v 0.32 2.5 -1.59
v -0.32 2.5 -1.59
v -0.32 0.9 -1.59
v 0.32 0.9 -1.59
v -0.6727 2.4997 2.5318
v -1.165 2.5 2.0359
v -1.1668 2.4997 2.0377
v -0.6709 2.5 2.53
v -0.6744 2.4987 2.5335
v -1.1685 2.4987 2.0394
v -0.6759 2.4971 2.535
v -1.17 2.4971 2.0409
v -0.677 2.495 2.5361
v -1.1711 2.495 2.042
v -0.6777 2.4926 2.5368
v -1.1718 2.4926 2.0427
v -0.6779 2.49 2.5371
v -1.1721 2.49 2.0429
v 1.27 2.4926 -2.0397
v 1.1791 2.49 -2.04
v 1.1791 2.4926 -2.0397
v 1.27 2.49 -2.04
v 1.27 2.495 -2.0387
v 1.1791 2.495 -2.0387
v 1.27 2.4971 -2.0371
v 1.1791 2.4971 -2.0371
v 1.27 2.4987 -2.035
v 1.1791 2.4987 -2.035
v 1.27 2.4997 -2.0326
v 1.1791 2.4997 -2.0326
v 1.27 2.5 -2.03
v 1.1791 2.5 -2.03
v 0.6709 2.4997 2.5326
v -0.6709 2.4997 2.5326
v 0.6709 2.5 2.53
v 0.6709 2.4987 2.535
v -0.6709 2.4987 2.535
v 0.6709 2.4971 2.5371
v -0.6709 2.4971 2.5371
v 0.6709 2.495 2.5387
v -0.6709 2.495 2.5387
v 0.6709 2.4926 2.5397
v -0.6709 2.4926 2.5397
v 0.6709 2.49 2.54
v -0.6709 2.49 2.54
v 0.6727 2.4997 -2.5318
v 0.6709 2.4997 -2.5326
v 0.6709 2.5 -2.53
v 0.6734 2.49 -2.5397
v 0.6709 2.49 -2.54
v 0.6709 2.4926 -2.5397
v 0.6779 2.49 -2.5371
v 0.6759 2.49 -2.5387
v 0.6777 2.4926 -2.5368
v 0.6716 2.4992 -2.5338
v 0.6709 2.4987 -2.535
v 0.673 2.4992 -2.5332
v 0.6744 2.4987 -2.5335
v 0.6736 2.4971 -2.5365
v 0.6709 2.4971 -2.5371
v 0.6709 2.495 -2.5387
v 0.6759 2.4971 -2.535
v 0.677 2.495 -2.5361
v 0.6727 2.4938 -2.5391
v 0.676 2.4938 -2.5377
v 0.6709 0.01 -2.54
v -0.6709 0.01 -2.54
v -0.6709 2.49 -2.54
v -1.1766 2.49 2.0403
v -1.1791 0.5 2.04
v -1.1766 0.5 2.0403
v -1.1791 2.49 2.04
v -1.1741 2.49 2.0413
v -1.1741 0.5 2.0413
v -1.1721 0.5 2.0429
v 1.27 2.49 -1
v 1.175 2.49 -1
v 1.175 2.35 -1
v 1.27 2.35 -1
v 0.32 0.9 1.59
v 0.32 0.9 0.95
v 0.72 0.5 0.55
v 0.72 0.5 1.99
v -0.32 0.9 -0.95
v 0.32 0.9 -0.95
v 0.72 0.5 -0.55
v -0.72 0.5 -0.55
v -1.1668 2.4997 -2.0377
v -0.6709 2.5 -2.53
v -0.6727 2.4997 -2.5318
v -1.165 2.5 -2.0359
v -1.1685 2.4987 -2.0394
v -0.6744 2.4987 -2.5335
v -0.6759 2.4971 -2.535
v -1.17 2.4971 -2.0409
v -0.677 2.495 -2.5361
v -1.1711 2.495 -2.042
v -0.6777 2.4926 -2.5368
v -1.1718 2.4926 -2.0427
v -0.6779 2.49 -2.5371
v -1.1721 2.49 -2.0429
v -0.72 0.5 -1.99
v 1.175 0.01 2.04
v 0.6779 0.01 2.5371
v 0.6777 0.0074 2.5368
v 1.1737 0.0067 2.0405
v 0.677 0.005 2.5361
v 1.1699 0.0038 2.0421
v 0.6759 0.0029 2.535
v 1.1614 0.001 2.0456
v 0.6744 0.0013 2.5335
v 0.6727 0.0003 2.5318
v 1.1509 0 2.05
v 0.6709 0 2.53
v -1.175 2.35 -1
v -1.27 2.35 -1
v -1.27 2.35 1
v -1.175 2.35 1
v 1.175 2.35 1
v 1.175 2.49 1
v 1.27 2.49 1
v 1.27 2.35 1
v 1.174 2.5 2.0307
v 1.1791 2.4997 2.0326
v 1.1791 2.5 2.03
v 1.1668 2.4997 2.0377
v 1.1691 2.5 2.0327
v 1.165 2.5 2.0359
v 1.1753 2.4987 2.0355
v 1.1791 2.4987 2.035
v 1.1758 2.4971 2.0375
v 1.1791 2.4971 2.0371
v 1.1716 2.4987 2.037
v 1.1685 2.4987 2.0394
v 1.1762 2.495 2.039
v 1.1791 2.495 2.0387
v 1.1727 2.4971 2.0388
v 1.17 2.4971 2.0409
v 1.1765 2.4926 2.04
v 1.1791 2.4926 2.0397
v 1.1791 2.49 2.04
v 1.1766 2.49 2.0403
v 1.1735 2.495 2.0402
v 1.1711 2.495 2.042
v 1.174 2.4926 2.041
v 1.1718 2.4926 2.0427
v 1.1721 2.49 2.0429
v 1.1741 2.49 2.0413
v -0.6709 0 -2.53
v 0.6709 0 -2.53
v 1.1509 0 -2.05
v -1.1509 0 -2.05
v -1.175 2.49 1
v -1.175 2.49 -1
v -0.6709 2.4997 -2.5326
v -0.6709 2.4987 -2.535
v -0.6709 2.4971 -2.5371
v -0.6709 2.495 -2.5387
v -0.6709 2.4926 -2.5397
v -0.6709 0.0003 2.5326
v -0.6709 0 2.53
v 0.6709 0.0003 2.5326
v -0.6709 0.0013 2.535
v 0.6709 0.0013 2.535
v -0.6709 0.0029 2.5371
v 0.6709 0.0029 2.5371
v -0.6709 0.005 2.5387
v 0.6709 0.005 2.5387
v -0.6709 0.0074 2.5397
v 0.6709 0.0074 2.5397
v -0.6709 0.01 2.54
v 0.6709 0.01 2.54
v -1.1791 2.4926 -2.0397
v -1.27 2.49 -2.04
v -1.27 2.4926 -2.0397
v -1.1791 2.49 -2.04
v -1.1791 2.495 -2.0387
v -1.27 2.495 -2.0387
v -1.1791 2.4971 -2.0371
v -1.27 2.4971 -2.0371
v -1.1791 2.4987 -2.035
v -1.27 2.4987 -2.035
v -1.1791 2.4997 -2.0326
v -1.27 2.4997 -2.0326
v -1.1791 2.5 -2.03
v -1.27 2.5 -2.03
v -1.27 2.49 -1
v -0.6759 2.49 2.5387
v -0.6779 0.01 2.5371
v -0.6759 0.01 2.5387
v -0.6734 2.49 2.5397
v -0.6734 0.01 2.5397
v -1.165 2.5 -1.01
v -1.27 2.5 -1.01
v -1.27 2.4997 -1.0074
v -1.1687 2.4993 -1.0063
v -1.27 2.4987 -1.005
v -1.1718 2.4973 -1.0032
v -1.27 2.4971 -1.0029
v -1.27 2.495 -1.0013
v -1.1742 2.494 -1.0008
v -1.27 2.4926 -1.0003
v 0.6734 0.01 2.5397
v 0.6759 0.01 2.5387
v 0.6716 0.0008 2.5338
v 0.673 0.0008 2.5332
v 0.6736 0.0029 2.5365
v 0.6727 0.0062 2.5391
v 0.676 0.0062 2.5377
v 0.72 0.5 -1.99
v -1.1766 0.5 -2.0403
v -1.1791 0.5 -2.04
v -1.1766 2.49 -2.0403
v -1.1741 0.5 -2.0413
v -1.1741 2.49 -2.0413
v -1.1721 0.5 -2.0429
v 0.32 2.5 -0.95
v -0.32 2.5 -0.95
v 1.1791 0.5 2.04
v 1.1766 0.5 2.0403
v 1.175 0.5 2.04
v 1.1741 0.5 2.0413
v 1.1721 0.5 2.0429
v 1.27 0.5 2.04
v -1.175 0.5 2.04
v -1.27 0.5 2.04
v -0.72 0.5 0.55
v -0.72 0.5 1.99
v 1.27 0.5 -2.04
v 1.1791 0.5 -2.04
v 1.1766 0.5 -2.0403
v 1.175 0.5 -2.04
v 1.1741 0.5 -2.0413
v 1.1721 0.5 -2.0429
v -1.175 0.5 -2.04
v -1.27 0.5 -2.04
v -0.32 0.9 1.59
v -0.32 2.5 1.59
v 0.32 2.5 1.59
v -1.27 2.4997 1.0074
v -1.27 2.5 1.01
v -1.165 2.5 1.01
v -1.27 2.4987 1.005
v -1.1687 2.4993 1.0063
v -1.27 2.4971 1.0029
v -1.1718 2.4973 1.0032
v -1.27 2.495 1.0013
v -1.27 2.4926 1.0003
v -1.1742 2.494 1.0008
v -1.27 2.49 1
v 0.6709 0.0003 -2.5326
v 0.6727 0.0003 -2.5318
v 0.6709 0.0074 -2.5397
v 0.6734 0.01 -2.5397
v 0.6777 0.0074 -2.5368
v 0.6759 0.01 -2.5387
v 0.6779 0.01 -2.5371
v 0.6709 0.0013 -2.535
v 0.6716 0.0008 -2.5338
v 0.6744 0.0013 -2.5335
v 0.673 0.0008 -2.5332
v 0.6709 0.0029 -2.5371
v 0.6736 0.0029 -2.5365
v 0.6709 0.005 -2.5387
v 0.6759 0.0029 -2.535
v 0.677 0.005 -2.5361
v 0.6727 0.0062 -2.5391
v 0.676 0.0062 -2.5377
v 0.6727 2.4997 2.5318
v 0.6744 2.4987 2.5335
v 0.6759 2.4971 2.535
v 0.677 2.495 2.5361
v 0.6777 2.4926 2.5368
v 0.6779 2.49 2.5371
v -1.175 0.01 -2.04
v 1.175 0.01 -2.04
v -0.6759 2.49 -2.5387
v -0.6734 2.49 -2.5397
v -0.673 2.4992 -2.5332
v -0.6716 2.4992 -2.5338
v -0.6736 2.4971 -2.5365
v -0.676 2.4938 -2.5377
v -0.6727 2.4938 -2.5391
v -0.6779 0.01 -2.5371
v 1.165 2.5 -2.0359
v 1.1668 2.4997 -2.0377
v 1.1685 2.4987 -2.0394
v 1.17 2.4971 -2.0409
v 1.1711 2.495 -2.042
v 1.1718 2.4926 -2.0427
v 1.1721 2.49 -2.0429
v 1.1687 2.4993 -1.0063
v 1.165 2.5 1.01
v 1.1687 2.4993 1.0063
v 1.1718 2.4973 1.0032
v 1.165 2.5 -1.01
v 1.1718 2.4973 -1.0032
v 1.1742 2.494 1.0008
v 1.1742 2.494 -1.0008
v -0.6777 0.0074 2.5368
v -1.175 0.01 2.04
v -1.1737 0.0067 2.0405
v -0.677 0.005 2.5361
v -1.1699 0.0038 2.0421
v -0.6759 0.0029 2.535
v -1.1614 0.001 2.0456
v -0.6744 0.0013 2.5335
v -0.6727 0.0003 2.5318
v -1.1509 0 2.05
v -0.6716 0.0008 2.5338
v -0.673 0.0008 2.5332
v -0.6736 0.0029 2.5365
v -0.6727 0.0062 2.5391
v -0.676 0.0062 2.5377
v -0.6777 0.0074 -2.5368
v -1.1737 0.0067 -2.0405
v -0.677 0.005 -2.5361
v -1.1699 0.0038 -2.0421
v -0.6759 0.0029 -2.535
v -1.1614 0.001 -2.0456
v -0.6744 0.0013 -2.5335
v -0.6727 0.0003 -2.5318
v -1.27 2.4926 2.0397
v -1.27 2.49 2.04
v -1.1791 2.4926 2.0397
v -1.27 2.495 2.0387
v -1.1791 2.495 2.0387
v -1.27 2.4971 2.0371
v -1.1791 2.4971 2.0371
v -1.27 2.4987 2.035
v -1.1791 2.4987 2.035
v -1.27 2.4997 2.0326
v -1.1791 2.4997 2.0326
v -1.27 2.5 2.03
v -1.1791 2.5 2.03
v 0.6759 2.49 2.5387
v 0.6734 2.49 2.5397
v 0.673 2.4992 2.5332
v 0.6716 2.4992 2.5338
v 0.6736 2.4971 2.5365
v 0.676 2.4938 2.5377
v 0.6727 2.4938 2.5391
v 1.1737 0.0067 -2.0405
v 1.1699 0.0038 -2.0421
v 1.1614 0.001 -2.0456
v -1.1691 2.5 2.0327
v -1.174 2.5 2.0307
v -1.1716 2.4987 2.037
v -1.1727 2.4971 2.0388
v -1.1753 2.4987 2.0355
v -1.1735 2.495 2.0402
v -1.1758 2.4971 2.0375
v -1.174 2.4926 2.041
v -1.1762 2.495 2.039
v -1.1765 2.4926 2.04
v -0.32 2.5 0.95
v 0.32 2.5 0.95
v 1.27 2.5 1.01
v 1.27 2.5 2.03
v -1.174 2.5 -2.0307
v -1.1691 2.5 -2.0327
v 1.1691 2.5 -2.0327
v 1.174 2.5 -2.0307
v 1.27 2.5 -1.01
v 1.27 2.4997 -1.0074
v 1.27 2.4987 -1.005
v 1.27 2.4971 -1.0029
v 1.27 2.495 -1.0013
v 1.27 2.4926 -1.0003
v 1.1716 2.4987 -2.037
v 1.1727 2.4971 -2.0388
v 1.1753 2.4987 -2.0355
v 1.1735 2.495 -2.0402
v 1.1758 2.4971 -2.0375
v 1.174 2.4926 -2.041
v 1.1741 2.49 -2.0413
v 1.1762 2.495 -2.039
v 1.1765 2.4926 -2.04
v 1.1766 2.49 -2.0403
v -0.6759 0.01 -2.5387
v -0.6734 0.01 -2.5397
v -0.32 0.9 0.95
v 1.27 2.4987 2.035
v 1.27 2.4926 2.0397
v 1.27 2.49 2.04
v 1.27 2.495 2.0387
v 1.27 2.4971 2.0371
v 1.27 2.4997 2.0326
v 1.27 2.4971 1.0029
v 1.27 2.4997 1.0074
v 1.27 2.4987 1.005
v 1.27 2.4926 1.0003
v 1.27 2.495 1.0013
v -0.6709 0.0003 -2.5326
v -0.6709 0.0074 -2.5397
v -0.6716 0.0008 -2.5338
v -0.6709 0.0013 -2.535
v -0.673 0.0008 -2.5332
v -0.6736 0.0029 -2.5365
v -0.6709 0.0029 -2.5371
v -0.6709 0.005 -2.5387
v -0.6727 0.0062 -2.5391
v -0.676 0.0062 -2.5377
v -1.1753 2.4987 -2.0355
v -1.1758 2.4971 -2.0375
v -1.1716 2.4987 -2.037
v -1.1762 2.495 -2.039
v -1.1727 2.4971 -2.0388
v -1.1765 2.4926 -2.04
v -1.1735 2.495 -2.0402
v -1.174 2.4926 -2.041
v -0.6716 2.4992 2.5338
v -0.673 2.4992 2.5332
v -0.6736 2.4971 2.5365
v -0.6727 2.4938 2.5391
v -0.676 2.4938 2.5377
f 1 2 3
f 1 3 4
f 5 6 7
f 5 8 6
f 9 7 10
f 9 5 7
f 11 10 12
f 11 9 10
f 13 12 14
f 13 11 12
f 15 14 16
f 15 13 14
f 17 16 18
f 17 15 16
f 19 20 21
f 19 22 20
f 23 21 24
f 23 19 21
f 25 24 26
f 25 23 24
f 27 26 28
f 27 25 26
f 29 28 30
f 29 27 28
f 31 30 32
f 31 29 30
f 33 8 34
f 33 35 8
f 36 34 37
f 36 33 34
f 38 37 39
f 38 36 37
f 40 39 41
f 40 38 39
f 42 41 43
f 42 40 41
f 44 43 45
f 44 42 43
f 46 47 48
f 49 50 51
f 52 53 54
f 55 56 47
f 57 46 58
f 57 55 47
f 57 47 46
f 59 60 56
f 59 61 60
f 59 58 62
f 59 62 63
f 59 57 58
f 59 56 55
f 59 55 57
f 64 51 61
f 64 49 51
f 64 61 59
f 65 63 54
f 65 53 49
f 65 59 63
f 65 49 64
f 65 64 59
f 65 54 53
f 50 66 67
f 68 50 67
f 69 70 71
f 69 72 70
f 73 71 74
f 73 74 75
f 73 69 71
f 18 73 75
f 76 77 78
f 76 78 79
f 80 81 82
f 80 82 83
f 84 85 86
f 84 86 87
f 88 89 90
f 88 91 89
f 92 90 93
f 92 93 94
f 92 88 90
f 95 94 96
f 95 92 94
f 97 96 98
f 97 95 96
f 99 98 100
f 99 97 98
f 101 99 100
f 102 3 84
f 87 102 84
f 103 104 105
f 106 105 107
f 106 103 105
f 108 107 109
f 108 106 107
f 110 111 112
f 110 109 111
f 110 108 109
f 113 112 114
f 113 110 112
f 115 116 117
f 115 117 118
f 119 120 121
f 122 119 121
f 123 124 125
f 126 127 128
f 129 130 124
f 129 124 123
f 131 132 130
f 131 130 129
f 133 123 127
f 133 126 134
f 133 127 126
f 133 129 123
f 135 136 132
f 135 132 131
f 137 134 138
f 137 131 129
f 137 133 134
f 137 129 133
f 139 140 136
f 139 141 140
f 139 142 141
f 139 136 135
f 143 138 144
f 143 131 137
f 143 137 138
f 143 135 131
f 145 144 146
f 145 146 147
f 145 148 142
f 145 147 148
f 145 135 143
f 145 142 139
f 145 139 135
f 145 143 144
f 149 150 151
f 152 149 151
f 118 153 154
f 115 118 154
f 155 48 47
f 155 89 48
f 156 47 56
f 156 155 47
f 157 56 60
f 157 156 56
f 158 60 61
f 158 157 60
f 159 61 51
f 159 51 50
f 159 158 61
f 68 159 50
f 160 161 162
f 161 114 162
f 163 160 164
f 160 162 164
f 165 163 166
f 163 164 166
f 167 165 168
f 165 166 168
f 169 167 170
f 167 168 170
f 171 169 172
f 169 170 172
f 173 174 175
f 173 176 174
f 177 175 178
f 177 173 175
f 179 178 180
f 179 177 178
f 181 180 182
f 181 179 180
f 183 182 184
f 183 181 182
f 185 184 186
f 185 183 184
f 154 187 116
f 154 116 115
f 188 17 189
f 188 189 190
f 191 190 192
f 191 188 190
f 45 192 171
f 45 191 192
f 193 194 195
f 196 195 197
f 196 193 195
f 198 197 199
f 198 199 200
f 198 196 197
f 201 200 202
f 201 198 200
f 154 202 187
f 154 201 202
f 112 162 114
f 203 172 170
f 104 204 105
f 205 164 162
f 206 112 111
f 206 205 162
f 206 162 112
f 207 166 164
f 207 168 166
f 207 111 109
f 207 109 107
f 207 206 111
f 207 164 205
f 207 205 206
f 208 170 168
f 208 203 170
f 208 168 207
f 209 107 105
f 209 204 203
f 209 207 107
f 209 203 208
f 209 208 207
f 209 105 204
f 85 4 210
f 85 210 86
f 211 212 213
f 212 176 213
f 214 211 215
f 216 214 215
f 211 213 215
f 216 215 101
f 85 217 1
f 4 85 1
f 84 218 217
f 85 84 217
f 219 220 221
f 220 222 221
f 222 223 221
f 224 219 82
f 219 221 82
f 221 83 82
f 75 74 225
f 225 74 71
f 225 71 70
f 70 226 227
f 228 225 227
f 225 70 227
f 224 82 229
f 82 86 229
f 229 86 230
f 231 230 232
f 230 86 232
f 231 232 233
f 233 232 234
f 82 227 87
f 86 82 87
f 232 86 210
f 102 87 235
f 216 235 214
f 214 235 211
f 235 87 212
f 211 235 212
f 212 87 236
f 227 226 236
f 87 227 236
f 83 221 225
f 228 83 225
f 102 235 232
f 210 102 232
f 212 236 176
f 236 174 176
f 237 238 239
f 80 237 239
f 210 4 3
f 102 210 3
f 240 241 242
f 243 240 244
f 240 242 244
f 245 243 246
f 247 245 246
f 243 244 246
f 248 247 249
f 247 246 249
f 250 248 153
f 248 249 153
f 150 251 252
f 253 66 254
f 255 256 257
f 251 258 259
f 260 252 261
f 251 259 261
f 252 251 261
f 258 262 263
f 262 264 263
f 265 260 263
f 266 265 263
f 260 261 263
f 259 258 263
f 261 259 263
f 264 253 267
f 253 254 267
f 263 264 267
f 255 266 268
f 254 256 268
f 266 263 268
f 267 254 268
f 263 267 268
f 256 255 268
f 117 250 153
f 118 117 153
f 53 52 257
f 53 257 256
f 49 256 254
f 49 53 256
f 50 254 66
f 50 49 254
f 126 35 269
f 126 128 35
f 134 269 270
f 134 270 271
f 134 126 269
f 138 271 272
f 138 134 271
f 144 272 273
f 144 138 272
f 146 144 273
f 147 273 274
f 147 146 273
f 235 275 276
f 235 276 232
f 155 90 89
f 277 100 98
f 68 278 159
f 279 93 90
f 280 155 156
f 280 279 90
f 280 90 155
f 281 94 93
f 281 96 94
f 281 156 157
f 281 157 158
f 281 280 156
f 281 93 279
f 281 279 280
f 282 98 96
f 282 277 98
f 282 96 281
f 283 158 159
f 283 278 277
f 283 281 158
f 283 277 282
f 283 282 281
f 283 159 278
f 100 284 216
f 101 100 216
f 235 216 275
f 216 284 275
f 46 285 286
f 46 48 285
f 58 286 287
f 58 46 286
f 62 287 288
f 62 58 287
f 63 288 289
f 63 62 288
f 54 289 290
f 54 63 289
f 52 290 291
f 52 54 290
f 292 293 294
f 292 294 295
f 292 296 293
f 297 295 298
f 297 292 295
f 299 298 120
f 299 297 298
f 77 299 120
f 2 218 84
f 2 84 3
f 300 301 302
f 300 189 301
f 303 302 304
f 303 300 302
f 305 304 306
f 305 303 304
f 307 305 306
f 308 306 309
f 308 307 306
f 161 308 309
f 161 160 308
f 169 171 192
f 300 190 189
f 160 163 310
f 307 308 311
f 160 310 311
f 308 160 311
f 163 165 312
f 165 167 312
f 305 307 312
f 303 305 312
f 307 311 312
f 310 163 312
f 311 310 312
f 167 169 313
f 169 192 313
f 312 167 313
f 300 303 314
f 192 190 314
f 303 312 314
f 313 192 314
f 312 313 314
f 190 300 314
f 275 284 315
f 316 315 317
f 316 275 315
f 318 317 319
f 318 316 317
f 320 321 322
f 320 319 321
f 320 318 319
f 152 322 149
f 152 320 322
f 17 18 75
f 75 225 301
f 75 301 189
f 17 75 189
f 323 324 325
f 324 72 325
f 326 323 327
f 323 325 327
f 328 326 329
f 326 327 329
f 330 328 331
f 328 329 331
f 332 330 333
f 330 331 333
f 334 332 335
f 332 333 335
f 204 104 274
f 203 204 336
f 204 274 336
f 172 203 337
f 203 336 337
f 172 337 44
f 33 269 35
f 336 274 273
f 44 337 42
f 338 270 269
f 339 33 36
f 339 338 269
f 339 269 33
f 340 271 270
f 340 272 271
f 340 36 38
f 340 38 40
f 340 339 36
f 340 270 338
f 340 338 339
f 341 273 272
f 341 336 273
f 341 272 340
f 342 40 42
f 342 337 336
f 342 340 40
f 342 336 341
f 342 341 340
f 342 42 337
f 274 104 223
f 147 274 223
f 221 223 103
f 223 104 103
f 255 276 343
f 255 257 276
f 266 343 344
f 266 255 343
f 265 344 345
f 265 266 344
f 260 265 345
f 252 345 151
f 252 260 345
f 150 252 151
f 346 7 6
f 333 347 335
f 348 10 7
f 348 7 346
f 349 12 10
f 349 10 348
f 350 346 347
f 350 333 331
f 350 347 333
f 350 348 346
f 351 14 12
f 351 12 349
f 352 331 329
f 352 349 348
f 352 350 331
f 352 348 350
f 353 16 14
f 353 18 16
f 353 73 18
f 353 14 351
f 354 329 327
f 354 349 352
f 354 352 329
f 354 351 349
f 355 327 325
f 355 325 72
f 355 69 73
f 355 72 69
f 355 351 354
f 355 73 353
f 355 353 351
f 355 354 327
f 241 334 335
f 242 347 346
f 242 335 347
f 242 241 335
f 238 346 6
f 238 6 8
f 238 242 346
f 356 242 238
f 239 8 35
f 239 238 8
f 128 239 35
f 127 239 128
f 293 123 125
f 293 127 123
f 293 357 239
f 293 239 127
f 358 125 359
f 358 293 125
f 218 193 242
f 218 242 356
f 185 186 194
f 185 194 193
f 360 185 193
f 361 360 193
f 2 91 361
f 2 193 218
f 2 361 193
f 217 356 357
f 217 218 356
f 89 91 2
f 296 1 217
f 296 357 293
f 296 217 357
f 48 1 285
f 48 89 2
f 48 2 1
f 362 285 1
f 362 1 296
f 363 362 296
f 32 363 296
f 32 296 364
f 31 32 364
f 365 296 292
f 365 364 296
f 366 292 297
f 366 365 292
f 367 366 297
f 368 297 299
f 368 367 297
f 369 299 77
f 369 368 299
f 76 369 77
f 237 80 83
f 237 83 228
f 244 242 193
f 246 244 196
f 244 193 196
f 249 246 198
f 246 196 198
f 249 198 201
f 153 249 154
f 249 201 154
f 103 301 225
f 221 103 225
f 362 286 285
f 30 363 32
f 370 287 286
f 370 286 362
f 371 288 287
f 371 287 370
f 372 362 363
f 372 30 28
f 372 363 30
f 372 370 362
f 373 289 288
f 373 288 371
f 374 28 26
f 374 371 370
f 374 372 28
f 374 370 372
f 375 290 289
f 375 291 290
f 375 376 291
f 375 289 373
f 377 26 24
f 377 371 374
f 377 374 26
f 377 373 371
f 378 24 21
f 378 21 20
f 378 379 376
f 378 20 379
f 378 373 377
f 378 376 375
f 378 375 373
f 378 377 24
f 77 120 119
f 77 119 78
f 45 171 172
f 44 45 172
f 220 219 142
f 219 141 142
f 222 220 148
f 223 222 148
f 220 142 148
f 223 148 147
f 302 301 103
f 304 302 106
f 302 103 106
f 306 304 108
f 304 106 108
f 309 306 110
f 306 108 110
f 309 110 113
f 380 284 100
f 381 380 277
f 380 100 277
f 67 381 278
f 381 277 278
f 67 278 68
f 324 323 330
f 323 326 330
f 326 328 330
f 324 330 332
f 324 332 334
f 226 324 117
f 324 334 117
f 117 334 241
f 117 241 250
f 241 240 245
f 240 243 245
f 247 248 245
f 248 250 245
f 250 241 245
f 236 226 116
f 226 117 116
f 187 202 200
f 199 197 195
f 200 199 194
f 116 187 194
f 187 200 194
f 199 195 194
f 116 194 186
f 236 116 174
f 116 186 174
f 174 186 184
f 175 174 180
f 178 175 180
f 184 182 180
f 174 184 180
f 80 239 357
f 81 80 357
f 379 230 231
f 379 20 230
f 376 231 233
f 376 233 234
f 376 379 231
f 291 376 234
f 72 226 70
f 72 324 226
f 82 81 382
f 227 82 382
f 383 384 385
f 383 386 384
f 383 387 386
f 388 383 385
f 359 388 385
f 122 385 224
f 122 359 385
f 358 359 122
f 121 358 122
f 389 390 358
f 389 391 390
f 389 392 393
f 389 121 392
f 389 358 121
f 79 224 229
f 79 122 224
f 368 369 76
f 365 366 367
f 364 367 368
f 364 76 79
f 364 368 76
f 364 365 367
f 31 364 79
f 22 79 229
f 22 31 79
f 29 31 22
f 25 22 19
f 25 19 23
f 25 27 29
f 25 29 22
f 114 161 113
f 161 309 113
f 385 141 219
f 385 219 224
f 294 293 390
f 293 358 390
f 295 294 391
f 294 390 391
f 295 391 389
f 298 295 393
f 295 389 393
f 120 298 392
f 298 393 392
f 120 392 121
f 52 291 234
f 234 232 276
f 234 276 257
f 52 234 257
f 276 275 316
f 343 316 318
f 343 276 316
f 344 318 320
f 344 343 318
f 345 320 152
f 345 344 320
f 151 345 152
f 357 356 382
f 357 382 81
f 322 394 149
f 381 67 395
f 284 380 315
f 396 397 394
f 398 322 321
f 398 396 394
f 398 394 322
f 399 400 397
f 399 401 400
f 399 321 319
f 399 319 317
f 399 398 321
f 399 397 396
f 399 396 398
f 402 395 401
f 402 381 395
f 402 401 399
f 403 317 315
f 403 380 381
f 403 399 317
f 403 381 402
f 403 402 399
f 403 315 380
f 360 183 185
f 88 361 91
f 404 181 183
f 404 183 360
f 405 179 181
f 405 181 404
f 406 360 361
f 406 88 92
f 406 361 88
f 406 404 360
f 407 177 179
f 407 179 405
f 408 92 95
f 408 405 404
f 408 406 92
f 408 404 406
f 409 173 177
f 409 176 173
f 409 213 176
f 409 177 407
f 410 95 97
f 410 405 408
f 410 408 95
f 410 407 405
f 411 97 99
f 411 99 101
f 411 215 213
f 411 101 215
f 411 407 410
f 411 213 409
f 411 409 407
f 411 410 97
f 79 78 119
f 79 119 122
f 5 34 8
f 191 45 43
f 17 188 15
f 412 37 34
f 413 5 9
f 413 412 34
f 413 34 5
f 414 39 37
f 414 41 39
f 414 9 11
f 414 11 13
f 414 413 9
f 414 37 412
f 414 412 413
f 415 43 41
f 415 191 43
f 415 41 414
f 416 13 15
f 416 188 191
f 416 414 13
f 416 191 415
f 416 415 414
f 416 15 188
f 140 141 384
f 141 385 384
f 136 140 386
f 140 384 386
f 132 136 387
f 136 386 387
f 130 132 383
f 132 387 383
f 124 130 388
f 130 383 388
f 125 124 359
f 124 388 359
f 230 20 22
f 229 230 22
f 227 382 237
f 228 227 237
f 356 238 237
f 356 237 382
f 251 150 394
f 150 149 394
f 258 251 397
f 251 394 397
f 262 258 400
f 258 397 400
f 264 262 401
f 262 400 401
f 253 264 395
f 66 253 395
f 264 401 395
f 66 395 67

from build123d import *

# Parameters (mm, degrees)
BOSS_EXTRUDE1_DEPTH     = 2.5
SKETCH7_W               = 0.64
SKETCH7_H               = 0.64
CUT_EXTRUDE1_DEPTH      = 4.752629078
SKETCH8_W               = 0.095
SKETCH8_H               = 4.08
BOSS_EXTRUDE2_DEPTH     = 2.5
SKETCH9_W               = 0.095
SKETCH9_H               = 2
CUT_EXTRUDE2_DEPTH      = 0.15
CUT_EXTRUDE3_DEPTH      = 5.376436907
CUT_EXTRUDE3_DEPTH_BACK = 5.376436907
SKETCH12_W              = 4.08
SKETCH12_H              = 0.5
CHAMFER1_SIZE           = 0.4
FILLET1_R               = 0.01


with BuildPart() as part:
    # Sketch5 → Boss-Extrude1 (new body)
    with BuildSketch(Plane(origin=(0, 0, 0), x_dir=(1, 0, 0), z_dir=(0, 1, 0))):
        Polygon((-0.675, 2.54), (-1.175, 2.04), (-1.175, -2.04), (-0.675, -2.54), (0.675, -2.54), (1.175, -2.04), (1.175, 2.04), (0.675, 2.54), align=None)
    extrude(amount=BOSS_EXTRUDE1_DEPTH)

    # Sketch7 → Cut-Extrude1 (cut, through all)
    with BuildSketch(Plane(origin=(0, 2.5, 0), x_dir=(1, 0, 0), z_dir=(0, 1, 0))):
        with Locations((0, 1.27)):
            Rectangle(SKETCH7_W, SKETCH7_H)
        with Locations((0, -1.27)):
            Rectangle(SKETCH7_W, SKETCH7_H)
    extrude(amount=-CUT_EXTRUDE1_DEPTH, mode=Mode.SUBTRACT)

    # Sketch8 → Boss-Extrude2 (add)
    with BuildSketch(Plane(origin=(0, 2.5, 0), x_dir=(1, 0, 0), z_dir=(0, 1, 0))):
        with Locations((-1.2225, 0)):
            Rectangle(SKETCH8_W, SKETCH8_H)
        with Locations((1.2225, 0)):
            Rectangle(SKETCH8_W, SKETCH8_H)
    extrude(amount=-BOSS_EXTRUDE2_DEPTH)

    # Sketch9 → Cut-Extrude2 (cut)
    with BuildSketch(Plane(origin=(0, 2.5, 0), x_dir=(1, 0, 0), z_dir=(0, 1, 0))):
        with Locations((-1.2225, 0)):
            Rectangle(SKETCH9_W, SKETCH9_H)
        with Locations((1.2225, 0)):
            Rectangle(SKETCH9_W, SKETCH9_H)
    extrude(amount=-CUT_EXTRUDE2_DEPTH, mode=Mode.SUBTRACT)

    # Sketch12 → Cut-Extrude3 (cut, two sides: drawn at the far end of the back side and taken through both)
    with BuildSketch(Plane(origin=(1.27, 0, 0), x_dir=(0, 0, -1), z_dir=(1, 0, 0)).offset(-CUT_EXTRUDE3_DEPTH_BACK)):
        with Locations((0, 0.25)):
            Rectangle(SKETCH12_W, SKETCH12_H)
    extrude(amount=CUT_EXTRUDE3_DEPTH + CUT_EXTRUDE3_DEPTH_BACK, mode=Mode.SUBTRACT)

    # Chamfer1
    chamfer1_edges = [part.edges().sort_by_distance(p)[0] for p in [
        (0, 0.5, -1.59),
        (0.32, 0.5, -1.27),
        (0, 0.5, -0.95),
        (-0.32, 0.5, -1.27),
        (0, 0.5, 1.59),
        (-0.32, 0.5, 1.27),
        (0, 0.5, 0.95),
        (0.32, 0.5, 1.27),
    ]]
    chamfer(chamfer1_edges, length=CHAMFER1_SIZE)

    # Fillet1
    fillet1_edges = [part.edges().sort_by_distance(p)[0] for p in [
        (-1.2225, 2.5, -2.04),
        (-0.925, 2.5, -2.29),
        (0, 0, -2.54),
        (0, 2.5, -2.54),
        (0.925, 2.5, -2.29),
        (1.2225, 2.5, -2.04),
        (1.2225, 2.5, -1),
        (1.175, 2.5, 0),
        (1.2225, 2.5, 1),
        (1.2225, 2.5, 2.04),
        (0.925, 2.5, 2.29),
        (0, 0, 2.54),
        (0, 2.5, 2.54),
        (-0.925, 2.5, 2.29),
        (-1.2225, 2.5, 2.04),
        (-1.2225, 2.5, 1),
        (-1.175, 2.5, 0),
        (-1.2225, 2.5, -1),
        (0.925, 0, -2.29),
        (-0.925, 0, -2.29),
        (0, 0, -2.04),
        (-0.925, 0, 2.29),
        (0.925, 0, 2.29),
        (0, 0, 2.04),
        (0.675, 1.25, -2.54),
        (-0.675, 1.25, -2.54),
        (-0.675, 1.25, 2.54),
        (0.675, 1.25, 2.54),
        (-1.175, 1.5, -2.04),
        (-1.175, 1.5, 2.04),
        (1.175, 1.5, -2.04),
        (1.175, 1.5, 2.04),
    ]]
    fillet(fillet1_edges, radius=FILLET1_R)


solid = part.part
